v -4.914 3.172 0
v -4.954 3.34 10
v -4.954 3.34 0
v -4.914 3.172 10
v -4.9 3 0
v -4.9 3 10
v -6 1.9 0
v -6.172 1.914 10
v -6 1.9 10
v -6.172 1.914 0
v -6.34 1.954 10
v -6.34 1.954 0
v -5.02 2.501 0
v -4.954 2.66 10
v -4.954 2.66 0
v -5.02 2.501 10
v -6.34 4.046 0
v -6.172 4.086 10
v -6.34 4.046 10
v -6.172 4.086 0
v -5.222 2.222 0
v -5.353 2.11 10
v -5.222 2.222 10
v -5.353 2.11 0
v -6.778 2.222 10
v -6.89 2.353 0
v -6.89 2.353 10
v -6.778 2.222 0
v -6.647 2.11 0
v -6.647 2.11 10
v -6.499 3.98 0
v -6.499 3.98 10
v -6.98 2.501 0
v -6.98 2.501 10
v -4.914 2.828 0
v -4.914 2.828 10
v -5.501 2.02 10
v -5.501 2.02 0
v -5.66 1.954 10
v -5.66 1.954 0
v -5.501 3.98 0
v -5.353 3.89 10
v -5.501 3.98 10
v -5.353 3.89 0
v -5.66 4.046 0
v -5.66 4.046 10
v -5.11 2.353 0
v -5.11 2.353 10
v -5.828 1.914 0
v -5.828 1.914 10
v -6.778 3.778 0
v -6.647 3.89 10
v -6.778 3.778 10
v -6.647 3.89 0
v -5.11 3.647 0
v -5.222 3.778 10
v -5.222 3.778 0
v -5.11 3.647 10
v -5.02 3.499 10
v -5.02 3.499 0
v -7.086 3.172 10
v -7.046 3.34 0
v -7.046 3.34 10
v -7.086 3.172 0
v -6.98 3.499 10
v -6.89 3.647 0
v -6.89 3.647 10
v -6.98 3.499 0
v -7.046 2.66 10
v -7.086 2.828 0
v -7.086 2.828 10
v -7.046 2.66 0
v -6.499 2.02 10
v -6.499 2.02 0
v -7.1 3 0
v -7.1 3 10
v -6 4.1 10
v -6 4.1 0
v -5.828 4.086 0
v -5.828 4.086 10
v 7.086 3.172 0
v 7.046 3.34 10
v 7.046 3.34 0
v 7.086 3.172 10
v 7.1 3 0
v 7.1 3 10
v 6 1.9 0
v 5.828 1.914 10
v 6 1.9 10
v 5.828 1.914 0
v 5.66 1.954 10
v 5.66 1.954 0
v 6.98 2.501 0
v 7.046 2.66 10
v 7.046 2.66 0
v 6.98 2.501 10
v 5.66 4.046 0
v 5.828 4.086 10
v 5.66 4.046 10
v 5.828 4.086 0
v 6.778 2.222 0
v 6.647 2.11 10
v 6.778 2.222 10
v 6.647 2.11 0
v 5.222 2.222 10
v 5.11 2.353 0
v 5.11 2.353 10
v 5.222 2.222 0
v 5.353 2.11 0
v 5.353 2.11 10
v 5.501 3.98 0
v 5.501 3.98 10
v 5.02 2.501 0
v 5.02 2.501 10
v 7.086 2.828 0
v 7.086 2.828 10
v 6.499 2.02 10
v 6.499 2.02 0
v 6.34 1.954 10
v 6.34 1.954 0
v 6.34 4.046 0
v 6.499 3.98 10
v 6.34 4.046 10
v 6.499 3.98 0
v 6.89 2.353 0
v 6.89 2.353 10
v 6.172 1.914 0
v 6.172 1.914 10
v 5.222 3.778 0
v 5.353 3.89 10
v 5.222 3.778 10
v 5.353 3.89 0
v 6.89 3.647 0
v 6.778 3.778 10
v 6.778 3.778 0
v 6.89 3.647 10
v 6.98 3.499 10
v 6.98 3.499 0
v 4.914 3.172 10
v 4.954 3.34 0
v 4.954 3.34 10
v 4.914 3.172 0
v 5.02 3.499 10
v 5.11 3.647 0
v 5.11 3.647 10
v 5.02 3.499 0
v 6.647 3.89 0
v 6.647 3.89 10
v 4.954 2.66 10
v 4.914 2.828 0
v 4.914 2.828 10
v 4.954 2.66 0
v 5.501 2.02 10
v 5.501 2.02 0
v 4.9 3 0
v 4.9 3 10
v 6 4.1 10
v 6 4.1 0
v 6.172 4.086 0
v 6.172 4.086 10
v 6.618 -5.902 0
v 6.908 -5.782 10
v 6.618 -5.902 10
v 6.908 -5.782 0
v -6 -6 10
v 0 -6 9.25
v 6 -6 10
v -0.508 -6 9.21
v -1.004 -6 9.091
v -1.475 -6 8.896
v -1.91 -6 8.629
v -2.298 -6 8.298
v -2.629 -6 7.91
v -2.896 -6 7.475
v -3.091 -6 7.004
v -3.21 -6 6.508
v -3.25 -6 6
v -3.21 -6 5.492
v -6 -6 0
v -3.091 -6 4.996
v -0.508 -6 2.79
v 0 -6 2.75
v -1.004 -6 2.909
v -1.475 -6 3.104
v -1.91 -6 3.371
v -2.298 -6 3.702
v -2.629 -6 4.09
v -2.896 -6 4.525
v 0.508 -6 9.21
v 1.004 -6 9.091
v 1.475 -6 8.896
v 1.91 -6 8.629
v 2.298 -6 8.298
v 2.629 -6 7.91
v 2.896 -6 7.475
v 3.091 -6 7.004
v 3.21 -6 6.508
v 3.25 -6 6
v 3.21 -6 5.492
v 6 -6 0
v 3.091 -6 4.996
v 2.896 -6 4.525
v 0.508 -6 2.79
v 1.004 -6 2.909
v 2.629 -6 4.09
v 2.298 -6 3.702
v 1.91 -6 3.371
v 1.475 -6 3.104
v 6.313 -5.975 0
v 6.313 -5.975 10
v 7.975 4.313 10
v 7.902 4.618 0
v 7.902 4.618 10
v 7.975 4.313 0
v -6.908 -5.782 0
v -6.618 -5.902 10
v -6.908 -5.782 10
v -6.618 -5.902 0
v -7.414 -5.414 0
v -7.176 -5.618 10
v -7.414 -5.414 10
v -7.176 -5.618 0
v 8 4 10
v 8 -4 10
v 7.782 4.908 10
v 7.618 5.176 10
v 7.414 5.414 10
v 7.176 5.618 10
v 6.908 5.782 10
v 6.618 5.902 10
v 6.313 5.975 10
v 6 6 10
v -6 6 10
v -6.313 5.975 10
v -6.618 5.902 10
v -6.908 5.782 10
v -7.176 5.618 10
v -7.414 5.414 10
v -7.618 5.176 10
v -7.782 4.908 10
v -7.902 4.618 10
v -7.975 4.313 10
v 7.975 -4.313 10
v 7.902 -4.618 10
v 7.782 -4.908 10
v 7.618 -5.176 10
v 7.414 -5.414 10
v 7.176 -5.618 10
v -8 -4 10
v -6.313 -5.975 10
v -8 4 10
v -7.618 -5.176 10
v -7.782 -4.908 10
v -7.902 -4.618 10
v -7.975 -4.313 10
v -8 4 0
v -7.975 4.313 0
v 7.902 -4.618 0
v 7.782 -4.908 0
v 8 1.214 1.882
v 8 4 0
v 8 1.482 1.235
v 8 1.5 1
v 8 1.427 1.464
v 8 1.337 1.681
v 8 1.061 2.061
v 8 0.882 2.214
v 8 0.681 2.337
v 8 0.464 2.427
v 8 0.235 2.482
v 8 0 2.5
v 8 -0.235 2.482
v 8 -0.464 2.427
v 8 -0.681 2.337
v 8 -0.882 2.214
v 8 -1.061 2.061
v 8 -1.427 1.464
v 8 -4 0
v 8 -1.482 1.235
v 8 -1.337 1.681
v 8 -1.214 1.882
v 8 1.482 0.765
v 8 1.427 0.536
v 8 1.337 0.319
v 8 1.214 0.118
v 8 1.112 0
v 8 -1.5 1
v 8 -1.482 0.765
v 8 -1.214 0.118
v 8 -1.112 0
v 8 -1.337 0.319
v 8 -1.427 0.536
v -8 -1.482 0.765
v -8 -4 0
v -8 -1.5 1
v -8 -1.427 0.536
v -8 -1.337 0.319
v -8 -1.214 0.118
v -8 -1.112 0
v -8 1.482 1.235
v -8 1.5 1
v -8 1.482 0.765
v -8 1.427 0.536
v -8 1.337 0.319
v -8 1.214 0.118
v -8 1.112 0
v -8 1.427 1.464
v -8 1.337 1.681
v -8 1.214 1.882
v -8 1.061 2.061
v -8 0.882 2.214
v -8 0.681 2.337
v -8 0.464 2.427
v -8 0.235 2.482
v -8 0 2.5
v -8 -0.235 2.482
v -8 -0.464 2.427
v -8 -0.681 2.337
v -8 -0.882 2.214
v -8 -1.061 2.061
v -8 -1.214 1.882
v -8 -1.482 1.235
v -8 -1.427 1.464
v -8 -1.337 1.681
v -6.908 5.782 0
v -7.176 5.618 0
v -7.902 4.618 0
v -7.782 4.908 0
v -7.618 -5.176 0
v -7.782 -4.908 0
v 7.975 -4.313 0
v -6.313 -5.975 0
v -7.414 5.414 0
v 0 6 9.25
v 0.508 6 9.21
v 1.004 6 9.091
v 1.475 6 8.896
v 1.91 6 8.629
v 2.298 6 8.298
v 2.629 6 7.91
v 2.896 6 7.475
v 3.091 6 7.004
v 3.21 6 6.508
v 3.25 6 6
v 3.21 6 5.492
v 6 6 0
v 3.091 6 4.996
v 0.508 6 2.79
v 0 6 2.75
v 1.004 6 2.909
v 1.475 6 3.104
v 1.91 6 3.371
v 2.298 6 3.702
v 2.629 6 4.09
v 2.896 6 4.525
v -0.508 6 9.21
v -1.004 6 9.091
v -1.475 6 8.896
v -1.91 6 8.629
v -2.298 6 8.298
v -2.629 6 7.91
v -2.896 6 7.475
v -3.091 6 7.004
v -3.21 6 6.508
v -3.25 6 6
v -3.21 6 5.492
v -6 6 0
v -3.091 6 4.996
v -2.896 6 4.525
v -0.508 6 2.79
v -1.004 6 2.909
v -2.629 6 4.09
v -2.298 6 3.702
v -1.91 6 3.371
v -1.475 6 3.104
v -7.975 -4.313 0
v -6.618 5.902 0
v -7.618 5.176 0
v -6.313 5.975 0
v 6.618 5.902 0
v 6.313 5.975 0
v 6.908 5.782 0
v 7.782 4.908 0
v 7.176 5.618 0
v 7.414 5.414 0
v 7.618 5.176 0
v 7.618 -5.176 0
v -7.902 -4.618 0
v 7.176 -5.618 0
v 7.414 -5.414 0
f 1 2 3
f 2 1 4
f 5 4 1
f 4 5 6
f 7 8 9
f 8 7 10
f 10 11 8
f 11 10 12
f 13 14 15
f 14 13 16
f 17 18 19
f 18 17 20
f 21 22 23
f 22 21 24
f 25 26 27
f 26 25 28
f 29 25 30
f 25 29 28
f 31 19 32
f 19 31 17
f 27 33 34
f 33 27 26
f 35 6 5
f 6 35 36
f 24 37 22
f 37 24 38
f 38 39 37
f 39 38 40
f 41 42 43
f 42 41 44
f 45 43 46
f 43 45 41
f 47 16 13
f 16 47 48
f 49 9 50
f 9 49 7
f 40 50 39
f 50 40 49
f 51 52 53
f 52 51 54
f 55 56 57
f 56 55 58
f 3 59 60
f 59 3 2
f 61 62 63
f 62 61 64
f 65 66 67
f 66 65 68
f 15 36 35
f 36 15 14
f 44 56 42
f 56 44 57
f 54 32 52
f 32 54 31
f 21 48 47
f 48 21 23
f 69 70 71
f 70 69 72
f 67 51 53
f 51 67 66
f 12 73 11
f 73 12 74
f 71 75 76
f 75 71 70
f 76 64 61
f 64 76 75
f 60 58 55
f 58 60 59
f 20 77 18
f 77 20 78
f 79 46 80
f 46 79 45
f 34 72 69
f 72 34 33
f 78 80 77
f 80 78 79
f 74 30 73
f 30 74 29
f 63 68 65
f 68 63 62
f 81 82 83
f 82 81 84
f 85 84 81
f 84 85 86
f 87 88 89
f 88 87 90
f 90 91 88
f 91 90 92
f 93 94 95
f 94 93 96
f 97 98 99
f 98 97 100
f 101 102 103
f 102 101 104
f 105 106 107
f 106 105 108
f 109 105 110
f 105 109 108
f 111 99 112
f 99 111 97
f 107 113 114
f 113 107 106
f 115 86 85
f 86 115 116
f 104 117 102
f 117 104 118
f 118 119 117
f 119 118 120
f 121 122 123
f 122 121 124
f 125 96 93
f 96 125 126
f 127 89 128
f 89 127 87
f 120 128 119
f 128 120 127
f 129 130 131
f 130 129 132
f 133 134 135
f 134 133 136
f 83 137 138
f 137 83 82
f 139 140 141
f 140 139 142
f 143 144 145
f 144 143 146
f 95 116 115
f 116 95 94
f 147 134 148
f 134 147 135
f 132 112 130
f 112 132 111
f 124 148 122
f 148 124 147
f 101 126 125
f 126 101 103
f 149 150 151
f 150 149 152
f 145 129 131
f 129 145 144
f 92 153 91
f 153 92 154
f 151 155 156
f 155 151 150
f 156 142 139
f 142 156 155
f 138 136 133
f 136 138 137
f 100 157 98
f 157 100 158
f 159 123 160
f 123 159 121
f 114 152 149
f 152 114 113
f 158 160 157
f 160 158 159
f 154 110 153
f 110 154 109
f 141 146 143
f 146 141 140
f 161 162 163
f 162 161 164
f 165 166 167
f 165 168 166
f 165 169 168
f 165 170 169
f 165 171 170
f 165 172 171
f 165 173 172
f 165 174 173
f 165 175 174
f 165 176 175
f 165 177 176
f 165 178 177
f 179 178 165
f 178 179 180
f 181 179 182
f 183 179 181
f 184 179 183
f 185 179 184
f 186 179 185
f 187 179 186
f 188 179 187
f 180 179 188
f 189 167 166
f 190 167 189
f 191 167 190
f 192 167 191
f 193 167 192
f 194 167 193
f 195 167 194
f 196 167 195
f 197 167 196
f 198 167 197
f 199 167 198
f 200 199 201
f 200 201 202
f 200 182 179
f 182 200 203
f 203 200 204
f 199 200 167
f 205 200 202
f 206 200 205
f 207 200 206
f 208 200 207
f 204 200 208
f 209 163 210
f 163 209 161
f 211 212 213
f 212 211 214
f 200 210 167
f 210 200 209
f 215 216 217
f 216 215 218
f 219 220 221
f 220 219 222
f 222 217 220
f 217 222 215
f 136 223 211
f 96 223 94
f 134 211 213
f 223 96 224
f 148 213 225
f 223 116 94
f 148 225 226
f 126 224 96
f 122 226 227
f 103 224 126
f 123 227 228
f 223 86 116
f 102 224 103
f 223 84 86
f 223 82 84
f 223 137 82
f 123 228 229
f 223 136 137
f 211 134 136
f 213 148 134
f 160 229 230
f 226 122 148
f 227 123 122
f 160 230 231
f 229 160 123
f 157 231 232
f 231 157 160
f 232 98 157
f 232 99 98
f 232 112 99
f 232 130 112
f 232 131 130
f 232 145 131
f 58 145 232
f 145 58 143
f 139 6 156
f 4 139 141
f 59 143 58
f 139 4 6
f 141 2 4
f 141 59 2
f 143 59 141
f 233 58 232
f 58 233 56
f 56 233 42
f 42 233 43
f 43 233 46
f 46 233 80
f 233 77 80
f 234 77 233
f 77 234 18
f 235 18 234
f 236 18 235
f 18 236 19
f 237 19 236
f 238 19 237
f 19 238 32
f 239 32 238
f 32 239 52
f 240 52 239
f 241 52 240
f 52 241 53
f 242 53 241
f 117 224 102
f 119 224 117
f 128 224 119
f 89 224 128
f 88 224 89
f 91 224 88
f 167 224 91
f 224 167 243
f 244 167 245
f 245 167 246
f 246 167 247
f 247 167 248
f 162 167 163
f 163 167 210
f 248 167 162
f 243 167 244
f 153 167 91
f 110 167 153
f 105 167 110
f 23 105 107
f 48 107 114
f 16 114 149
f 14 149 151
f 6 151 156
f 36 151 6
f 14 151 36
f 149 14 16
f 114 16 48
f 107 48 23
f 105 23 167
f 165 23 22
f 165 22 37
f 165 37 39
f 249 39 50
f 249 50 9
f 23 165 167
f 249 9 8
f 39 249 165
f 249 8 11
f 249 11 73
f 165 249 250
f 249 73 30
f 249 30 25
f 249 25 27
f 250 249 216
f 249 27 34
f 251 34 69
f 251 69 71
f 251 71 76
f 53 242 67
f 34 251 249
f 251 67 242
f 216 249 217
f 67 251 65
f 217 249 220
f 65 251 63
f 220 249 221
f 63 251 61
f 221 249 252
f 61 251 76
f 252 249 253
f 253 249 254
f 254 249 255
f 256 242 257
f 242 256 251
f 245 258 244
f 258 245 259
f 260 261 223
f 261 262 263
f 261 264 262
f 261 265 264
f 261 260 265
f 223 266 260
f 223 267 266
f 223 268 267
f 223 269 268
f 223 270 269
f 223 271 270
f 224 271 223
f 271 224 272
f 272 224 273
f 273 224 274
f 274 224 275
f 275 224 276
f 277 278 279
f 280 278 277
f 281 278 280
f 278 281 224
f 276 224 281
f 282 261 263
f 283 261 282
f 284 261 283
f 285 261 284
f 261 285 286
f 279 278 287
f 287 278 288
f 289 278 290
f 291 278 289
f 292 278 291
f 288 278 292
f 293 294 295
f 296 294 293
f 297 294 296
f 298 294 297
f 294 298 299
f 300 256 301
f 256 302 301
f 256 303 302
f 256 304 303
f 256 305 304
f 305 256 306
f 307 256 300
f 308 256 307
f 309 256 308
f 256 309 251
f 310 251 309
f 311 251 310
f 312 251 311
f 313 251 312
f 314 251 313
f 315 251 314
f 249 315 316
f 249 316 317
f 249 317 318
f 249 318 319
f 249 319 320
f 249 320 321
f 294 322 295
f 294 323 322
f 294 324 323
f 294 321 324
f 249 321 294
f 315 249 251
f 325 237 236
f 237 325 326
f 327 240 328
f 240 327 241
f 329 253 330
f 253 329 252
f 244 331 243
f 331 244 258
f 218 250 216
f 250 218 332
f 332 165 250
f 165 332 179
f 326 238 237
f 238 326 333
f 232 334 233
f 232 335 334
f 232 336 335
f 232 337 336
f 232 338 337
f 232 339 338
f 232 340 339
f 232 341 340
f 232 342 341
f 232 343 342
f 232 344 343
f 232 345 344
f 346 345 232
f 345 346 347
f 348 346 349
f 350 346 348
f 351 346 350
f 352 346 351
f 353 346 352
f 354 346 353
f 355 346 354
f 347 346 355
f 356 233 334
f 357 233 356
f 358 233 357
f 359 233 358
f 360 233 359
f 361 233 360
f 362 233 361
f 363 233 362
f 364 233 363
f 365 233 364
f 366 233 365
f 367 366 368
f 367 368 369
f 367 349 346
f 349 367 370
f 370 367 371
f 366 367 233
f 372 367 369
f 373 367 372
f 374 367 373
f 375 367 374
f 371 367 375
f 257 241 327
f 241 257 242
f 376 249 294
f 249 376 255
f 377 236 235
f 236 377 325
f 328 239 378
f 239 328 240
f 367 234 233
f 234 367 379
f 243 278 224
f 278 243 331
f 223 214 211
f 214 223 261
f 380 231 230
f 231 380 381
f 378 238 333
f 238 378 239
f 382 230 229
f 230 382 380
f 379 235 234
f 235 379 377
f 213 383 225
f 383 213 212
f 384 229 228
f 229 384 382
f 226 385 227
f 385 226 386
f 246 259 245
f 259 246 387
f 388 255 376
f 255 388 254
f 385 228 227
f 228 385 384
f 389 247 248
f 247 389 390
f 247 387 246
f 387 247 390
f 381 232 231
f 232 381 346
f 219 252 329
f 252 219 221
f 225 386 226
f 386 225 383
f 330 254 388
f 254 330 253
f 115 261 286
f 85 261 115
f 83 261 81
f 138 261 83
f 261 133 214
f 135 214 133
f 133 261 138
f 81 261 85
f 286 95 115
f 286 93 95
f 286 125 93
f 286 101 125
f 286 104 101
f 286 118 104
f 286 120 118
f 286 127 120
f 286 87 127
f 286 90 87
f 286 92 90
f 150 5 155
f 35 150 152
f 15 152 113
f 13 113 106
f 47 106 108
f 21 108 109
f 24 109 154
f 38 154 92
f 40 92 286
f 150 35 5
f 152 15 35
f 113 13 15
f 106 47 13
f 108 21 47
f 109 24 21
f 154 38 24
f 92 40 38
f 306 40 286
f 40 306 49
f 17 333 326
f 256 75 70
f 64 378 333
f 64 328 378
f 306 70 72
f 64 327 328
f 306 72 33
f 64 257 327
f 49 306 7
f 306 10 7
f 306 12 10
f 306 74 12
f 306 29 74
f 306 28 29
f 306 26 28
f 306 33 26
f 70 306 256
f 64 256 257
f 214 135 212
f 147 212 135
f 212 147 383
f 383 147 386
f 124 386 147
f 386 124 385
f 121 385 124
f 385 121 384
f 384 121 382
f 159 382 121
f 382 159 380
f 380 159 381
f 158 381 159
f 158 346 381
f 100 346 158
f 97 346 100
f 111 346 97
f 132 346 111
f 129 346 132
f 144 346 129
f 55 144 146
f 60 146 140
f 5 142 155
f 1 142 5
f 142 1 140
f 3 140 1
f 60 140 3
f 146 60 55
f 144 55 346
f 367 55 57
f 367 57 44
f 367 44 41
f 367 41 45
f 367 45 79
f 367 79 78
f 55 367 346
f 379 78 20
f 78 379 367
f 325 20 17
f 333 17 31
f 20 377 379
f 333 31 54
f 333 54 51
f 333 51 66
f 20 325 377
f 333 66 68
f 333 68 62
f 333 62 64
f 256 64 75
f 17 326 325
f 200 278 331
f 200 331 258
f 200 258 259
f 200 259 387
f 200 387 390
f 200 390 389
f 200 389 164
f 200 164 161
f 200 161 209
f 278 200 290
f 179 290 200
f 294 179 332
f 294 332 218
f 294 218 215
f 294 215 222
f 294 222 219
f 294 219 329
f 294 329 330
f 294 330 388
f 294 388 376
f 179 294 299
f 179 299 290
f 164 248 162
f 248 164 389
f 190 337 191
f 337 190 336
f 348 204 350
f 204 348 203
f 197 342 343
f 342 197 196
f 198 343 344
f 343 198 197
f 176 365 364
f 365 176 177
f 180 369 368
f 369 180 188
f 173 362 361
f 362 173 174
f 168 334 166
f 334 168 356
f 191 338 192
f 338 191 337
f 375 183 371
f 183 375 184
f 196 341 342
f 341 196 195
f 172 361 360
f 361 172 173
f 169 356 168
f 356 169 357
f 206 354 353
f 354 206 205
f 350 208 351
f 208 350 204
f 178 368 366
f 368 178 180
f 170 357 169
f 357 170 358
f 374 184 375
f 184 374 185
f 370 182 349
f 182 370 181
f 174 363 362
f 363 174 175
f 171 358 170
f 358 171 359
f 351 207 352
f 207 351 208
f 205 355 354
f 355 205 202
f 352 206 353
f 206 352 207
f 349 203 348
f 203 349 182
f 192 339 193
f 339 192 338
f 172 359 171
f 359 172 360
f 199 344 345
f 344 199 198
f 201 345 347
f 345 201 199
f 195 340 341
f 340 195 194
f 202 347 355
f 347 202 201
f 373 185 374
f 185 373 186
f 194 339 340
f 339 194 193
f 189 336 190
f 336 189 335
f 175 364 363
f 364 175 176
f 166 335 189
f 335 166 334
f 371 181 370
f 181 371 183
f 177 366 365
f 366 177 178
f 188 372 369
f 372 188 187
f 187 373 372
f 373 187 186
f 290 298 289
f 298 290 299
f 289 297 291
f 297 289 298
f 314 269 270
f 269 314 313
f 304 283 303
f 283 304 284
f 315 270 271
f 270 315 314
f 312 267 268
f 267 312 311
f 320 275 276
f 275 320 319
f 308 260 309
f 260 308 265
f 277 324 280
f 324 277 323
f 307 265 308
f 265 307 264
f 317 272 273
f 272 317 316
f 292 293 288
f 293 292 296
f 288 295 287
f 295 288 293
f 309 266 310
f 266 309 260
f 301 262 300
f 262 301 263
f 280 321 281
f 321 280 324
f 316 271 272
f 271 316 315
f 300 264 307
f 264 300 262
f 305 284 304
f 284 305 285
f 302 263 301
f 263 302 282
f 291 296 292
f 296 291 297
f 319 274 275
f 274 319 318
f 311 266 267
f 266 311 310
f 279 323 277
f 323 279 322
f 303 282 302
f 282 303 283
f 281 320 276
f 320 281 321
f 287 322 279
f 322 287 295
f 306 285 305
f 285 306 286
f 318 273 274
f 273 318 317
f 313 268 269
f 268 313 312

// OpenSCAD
// file: utilities.scad
// ============================================================================
// Meshtastic Sliding Phone - Utility Modules
// ============================================================================
// Reusable shapes and helpers for all phone components.
// ============================================================================

include <parameters.scad>

// Rounded rectangle (2D profile for linear_extrude)
module rounded_rect(w, h, r) {
    offset(r = r)
        square([w - 2*r, h - 2*r], center = true);
}

// Rounded box (3D)
module rounded_box(w, h, d, r) {
    linear_extrude(height = d)
        rounded_rect(w, h, r);
}

// Hollow rounded box (shell)
module rounded_shell(w, h, d, r, t) {
    difference() {
        rounded_box(w, h, d, r);
        translate([0, 0, t])
            rounded_box(w - 2*t, h - 2*t, d, max(r - t, 0.5));
    }
}

// Screw post (solid cylinder with screw hole)
module screw_post(h, od, id) {
    difference() {
        cylinder(h = h, d = od);
        translate([0, 0, -0.1])
            cylinder(h = h + 0.2, d = id);
    }
}

// Grid of rounded rectangles (for speaker grille, ventilation)
module grille_pattern(cols, rows, slot_w, slot_h, spacing, slot_r) {
    total_w = cols * (slot_w + spacing) - spacing;
    total_h = rows * (slot_h + spacing) - spacing;
    translate([-total_w/2, -total_h/2, 0])
        for (c = [0 : cols-1])
            for (r = [0 : rows-1])
                translate([c * (slot_w + spacing) + slot_w/2,
                           r * (slot_h + spacing) + slot_h/2, 0])
                    rounded_rect(slot_w, slot_h, slot_r);
}

// Dovetail profile (2D) for slide rails
module dovetail_profile(w, h, taper = 0.7) {
    polygon(points = [
        [-w/2,        0],
        [-w*taper/2,  h],
        [ w*taper/2,  h],
        [ w/2,        0]
    ]);
}

// Dovetail rail (3D extrusion)
module dovetail_rail(w, h, length) {
    rotate([90, 0, 0])
        linear_extrude(height = length, center = true)
            dovetail_profile(w, h);
}

// Dovetail channel (3D, with clearance)
module dovetail_channel(w, h, length, cl) {
    rotate([90, 0, 0])
        linear_extrude(height = length + 0.2, center = true)
            dovetail_profile(w + cl*2, h + cl);
}
// file: parameters.scad
// ============================================================================
// Meshtastic Sliding Phone - Shared Parameters
// ============================================================================
// All dimensions in millimeters. Adjust these values to fit your specific
// hardware revision and printer tolerances.
// ============================================================================

// --- Overall phone dimensions (closed position) ---
phone_length    = 140;   // Y-axis (tall)
phone_width     = 68;    // X-axis (wide)
phone_thickness = 18;    // Z-axis (thick)

// --- Wall thickness and tolerances ---
wall            = 1.8;   // General wall thickness
clearance       = 0.3;   // Sliding fit clearance per side
corner_radius   = 4;     // Rounded corner radius

// --- Display cutout (2.8" IPS LCD, 320x240) ---
display_w       = 57;    // Viewable width
display_h       = 43;    // Viewable height
display_offset_y = 18;   // Offset from top edge of top shell
display_depth   = 3.5;   // Module thickness

// --- T-Beam V1.2 board dimensions ---
pcb_length      = 100;   // Board length
pcb_width       = 33;    // Board width
pcb_thickness   = 1.6;   // PCB thickness
pcb_clearance   = 12;    // Component height above PCB

// --- 18650 Battery ---
battery_diameter = 18.5; // With wrapper tolerance
battery_length   = 65.5;

// --- Keyboard area (revealed by slide) ---
keyboard_travel  = 52;   // How far the top shell slides
keyboard_rows    = 4;
keyboard_cols    = 10;
key_size         = 5;    // Individual key cap size
key_spacing      = 1;    // Gap between keys

// --- Slide rail mechanism ---
rail_width       = 4;    // Width of each rail
rail_height      = 2;    // Height/depth of rail channel
rail_length_top  = 100;  // Rail length on top shell
rail_length_bot  = 100;  // Rail length on bottom shell

// --- Antenna (SMA connector) ---
sma_diameter     = 6.5;  // SMA connector hole
sma_flat_width   = 8;    // Wrench flat width

// --- USB-C port ---
usbc_width       = 9.5;
usbc_height      = 3.5;

// --- Speaker and microphone ---
speaker_diameter = 12;
mic_diameter     = 2;

// --- Screw posts ---
screw_hole_d     = 2.2;  // M2 screw
screw_post_d     = 5;
screw_post_h     = 6;

// --- Derived dimensions ---
top_shell_length  = phone_length;
top_shell_width   = phone_width;
top_shell_z       = phone_thickness / 2;

bot_shell_length  = phone_length + keyboard_travel;
bot_shell_width   = phone_width;
bot_shell_z       = phone_thickness / 2;

// --- Quality settings ---
$fn = 40;  // Facet count for curves (increase for smoother exports)
// main file
// ============================================================================
// Meshtastic Sliding Phone - Antenna Mount
// ============================================================================
// Protective cap and strain relief for the SMA LoRa antenna connector.
// Attaches to the top edge of the bottom shell. Can be used with a
// stubby antenna or as a feed-through for an external whip antenna.
//
// Print settings: 0.2mm layer height, 40% infill
// ============================================================================

include <parameters.scad>
use <utilities.scad>

module antenna_mount() {
    mount_w    = 16;
    mount_l    = 12;
    mount_h    = 10;
    flange_h   = 3;
    flange_ext = 3;  // How far the flange extends past the shell wall

    difference() {
        union() {
            // --- Mount body ---
            rounded_box(mount_w, mount_l, mount_h, 2);

            // --- Flange (sits against inside of shell wall) ---
            translate([0, -mount_l/2 + flange_h/2, 0])
                rounded_box(mount_w + 2*flange_ext, flange_h, mount_h, 1.5);
        }

        // --- SMA connector through-hole ---
        translate([0, 0, mount_h/2 + 1])
            rotate([90, 0, 0])
                cylinder(h = mount_l + flange_h + 1, d = sma_diameter, center = true);

        // --- Wrench flat relief (hexagonal for SMA nut) ---
        translate([0, -mount_l/2 - 0.1, mount_h/2 + 1])
            rotate([90, 0, 0])
                cylinder(h = 3, d = sma_flat_width + 1, $fn = 6);

        // --- Screw mounting holes ---
        for (side = [-1, 1]) {
            translate([side * (mount_w/2 - 2), mount_l/2 - 3, -0.1])
                cylinder(h = mount_h + 0.2, d = screw_hole_d);
        }

        // --- Cable routing channel (bottom) ---
        translate([0, 0, 1])
            rotate([0, 90, 0])
                cylinder(h = mount_w + 1, d = 3, center = true);
    }
}

// --- Render ---
antenna_mount();
